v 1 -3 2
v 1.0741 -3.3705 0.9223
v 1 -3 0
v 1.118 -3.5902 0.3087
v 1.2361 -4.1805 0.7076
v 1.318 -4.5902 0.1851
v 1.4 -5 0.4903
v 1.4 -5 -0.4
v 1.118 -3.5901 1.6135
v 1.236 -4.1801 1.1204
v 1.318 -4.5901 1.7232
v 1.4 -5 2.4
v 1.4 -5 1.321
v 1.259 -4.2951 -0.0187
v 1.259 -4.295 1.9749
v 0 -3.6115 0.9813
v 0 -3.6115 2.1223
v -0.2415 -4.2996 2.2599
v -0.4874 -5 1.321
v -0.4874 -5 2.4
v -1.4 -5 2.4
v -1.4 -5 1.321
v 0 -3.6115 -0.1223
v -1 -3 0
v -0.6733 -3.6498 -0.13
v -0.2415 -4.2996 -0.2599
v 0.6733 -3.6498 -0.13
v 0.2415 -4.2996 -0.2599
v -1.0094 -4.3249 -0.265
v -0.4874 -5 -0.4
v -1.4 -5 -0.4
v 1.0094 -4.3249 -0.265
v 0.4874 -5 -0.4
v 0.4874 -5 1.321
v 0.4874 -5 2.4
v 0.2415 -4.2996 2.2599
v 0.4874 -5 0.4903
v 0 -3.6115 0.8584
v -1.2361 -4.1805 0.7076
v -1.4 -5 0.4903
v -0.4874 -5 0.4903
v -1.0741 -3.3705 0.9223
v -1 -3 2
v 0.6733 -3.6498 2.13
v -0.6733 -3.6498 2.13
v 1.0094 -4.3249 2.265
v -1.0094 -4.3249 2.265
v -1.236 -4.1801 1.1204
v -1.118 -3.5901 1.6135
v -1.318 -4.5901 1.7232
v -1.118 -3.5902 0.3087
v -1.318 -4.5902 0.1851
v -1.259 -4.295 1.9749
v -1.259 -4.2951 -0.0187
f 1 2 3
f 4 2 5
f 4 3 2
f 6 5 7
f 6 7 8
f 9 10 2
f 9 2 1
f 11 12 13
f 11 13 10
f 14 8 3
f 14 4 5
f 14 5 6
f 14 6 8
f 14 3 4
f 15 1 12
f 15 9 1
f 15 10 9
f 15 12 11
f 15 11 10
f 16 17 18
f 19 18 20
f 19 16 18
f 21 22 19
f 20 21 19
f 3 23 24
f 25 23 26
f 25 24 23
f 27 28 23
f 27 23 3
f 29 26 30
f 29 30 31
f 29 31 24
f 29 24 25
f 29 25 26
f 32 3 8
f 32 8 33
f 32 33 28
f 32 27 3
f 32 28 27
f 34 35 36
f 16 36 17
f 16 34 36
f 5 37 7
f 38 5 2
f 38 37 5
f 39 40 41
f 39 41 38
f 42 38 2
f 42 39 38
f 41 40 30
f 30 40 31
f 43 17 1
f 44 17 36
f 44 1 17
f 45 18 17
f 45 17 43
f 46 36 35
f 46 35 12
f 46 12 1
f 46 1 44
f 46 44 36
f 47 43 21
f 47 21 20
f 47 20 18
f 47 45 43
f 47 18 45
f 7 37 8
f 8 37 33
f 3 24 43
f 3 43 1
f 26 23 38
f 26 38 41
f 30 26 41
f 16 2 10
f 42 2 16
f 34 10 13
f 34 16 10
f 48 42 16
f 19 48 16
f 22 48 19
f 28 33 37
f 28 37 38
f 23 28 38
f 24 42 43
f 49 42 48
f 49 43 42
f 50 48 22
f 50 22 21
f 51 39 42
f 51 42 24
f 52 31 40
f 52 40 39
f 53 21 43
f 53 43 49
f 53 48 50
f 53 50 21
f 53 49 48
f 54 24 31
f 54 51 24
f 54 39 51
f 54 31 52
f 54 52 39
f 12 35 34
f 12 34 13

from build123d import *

# Parameters (mm, degrees)
SKETCH2_W          = 2
SKETCH2_H          = 2
SKETCH3_W          = 2.8
SKETCH3_H          = 2.8
CUT_EXTRUDE1_START = -3.2
CUT_EXTRUDE1_DEPTH = 2.8
CUT_EXTRUDE2_START = -3.4
CUT_EXTRUDE2_DEPTH = 2.8


with BuildPart() as part:
    # Sketch2 → Loft1 section 0
    with BuildSketch(Plane.XZ.offset(3)):
        with Locations((0, 1)):
            Rectangle(SKETCH2_W, SKETCH2_H)
    # Sketch3 → Loft1 section 1
    with BuildSketch(Plane(origin=(0, -5, 0), x_dir=(-1, 0, 0), z_dir=(0, -1, 0))):
        with Locations((0, -1)):
            Rectangle(SKETCH3_W, SKETCH3_H)
    loft()

    # Sketch7 → Cut-Extrude1 (cut)
    with BuildSketch(Plane(origin=(1.8, 0, 0), x_dir=(0, 0, -1), z_dir=(1, 0, 0)).offset(CUT_EXTRUDE1_START)):
        Polygon((-0.395154694, -5.358903747), (-0.922322496, -3.37054148), (-1.444019859, -5.50302185), align=None)
    extrude(amount=CUT_EXTRUDE1_DEPTH, mode=Mode.SUBTRACT)

    # Sketch4 → Cut-Extrude2 (cut)
    with BuildSketch(Plane.XY.offset(3).offset(CUT_EXTRUDE2_START)):
        Polygon((0, -3.611513086), (-0.5, -5.035852242), (0.5, -5.035852242), align=None)
    extrude(amount=CUT_EXTRUDE2_DEPTH, mode=Mode.SUBTRACT)


solid = part.part
